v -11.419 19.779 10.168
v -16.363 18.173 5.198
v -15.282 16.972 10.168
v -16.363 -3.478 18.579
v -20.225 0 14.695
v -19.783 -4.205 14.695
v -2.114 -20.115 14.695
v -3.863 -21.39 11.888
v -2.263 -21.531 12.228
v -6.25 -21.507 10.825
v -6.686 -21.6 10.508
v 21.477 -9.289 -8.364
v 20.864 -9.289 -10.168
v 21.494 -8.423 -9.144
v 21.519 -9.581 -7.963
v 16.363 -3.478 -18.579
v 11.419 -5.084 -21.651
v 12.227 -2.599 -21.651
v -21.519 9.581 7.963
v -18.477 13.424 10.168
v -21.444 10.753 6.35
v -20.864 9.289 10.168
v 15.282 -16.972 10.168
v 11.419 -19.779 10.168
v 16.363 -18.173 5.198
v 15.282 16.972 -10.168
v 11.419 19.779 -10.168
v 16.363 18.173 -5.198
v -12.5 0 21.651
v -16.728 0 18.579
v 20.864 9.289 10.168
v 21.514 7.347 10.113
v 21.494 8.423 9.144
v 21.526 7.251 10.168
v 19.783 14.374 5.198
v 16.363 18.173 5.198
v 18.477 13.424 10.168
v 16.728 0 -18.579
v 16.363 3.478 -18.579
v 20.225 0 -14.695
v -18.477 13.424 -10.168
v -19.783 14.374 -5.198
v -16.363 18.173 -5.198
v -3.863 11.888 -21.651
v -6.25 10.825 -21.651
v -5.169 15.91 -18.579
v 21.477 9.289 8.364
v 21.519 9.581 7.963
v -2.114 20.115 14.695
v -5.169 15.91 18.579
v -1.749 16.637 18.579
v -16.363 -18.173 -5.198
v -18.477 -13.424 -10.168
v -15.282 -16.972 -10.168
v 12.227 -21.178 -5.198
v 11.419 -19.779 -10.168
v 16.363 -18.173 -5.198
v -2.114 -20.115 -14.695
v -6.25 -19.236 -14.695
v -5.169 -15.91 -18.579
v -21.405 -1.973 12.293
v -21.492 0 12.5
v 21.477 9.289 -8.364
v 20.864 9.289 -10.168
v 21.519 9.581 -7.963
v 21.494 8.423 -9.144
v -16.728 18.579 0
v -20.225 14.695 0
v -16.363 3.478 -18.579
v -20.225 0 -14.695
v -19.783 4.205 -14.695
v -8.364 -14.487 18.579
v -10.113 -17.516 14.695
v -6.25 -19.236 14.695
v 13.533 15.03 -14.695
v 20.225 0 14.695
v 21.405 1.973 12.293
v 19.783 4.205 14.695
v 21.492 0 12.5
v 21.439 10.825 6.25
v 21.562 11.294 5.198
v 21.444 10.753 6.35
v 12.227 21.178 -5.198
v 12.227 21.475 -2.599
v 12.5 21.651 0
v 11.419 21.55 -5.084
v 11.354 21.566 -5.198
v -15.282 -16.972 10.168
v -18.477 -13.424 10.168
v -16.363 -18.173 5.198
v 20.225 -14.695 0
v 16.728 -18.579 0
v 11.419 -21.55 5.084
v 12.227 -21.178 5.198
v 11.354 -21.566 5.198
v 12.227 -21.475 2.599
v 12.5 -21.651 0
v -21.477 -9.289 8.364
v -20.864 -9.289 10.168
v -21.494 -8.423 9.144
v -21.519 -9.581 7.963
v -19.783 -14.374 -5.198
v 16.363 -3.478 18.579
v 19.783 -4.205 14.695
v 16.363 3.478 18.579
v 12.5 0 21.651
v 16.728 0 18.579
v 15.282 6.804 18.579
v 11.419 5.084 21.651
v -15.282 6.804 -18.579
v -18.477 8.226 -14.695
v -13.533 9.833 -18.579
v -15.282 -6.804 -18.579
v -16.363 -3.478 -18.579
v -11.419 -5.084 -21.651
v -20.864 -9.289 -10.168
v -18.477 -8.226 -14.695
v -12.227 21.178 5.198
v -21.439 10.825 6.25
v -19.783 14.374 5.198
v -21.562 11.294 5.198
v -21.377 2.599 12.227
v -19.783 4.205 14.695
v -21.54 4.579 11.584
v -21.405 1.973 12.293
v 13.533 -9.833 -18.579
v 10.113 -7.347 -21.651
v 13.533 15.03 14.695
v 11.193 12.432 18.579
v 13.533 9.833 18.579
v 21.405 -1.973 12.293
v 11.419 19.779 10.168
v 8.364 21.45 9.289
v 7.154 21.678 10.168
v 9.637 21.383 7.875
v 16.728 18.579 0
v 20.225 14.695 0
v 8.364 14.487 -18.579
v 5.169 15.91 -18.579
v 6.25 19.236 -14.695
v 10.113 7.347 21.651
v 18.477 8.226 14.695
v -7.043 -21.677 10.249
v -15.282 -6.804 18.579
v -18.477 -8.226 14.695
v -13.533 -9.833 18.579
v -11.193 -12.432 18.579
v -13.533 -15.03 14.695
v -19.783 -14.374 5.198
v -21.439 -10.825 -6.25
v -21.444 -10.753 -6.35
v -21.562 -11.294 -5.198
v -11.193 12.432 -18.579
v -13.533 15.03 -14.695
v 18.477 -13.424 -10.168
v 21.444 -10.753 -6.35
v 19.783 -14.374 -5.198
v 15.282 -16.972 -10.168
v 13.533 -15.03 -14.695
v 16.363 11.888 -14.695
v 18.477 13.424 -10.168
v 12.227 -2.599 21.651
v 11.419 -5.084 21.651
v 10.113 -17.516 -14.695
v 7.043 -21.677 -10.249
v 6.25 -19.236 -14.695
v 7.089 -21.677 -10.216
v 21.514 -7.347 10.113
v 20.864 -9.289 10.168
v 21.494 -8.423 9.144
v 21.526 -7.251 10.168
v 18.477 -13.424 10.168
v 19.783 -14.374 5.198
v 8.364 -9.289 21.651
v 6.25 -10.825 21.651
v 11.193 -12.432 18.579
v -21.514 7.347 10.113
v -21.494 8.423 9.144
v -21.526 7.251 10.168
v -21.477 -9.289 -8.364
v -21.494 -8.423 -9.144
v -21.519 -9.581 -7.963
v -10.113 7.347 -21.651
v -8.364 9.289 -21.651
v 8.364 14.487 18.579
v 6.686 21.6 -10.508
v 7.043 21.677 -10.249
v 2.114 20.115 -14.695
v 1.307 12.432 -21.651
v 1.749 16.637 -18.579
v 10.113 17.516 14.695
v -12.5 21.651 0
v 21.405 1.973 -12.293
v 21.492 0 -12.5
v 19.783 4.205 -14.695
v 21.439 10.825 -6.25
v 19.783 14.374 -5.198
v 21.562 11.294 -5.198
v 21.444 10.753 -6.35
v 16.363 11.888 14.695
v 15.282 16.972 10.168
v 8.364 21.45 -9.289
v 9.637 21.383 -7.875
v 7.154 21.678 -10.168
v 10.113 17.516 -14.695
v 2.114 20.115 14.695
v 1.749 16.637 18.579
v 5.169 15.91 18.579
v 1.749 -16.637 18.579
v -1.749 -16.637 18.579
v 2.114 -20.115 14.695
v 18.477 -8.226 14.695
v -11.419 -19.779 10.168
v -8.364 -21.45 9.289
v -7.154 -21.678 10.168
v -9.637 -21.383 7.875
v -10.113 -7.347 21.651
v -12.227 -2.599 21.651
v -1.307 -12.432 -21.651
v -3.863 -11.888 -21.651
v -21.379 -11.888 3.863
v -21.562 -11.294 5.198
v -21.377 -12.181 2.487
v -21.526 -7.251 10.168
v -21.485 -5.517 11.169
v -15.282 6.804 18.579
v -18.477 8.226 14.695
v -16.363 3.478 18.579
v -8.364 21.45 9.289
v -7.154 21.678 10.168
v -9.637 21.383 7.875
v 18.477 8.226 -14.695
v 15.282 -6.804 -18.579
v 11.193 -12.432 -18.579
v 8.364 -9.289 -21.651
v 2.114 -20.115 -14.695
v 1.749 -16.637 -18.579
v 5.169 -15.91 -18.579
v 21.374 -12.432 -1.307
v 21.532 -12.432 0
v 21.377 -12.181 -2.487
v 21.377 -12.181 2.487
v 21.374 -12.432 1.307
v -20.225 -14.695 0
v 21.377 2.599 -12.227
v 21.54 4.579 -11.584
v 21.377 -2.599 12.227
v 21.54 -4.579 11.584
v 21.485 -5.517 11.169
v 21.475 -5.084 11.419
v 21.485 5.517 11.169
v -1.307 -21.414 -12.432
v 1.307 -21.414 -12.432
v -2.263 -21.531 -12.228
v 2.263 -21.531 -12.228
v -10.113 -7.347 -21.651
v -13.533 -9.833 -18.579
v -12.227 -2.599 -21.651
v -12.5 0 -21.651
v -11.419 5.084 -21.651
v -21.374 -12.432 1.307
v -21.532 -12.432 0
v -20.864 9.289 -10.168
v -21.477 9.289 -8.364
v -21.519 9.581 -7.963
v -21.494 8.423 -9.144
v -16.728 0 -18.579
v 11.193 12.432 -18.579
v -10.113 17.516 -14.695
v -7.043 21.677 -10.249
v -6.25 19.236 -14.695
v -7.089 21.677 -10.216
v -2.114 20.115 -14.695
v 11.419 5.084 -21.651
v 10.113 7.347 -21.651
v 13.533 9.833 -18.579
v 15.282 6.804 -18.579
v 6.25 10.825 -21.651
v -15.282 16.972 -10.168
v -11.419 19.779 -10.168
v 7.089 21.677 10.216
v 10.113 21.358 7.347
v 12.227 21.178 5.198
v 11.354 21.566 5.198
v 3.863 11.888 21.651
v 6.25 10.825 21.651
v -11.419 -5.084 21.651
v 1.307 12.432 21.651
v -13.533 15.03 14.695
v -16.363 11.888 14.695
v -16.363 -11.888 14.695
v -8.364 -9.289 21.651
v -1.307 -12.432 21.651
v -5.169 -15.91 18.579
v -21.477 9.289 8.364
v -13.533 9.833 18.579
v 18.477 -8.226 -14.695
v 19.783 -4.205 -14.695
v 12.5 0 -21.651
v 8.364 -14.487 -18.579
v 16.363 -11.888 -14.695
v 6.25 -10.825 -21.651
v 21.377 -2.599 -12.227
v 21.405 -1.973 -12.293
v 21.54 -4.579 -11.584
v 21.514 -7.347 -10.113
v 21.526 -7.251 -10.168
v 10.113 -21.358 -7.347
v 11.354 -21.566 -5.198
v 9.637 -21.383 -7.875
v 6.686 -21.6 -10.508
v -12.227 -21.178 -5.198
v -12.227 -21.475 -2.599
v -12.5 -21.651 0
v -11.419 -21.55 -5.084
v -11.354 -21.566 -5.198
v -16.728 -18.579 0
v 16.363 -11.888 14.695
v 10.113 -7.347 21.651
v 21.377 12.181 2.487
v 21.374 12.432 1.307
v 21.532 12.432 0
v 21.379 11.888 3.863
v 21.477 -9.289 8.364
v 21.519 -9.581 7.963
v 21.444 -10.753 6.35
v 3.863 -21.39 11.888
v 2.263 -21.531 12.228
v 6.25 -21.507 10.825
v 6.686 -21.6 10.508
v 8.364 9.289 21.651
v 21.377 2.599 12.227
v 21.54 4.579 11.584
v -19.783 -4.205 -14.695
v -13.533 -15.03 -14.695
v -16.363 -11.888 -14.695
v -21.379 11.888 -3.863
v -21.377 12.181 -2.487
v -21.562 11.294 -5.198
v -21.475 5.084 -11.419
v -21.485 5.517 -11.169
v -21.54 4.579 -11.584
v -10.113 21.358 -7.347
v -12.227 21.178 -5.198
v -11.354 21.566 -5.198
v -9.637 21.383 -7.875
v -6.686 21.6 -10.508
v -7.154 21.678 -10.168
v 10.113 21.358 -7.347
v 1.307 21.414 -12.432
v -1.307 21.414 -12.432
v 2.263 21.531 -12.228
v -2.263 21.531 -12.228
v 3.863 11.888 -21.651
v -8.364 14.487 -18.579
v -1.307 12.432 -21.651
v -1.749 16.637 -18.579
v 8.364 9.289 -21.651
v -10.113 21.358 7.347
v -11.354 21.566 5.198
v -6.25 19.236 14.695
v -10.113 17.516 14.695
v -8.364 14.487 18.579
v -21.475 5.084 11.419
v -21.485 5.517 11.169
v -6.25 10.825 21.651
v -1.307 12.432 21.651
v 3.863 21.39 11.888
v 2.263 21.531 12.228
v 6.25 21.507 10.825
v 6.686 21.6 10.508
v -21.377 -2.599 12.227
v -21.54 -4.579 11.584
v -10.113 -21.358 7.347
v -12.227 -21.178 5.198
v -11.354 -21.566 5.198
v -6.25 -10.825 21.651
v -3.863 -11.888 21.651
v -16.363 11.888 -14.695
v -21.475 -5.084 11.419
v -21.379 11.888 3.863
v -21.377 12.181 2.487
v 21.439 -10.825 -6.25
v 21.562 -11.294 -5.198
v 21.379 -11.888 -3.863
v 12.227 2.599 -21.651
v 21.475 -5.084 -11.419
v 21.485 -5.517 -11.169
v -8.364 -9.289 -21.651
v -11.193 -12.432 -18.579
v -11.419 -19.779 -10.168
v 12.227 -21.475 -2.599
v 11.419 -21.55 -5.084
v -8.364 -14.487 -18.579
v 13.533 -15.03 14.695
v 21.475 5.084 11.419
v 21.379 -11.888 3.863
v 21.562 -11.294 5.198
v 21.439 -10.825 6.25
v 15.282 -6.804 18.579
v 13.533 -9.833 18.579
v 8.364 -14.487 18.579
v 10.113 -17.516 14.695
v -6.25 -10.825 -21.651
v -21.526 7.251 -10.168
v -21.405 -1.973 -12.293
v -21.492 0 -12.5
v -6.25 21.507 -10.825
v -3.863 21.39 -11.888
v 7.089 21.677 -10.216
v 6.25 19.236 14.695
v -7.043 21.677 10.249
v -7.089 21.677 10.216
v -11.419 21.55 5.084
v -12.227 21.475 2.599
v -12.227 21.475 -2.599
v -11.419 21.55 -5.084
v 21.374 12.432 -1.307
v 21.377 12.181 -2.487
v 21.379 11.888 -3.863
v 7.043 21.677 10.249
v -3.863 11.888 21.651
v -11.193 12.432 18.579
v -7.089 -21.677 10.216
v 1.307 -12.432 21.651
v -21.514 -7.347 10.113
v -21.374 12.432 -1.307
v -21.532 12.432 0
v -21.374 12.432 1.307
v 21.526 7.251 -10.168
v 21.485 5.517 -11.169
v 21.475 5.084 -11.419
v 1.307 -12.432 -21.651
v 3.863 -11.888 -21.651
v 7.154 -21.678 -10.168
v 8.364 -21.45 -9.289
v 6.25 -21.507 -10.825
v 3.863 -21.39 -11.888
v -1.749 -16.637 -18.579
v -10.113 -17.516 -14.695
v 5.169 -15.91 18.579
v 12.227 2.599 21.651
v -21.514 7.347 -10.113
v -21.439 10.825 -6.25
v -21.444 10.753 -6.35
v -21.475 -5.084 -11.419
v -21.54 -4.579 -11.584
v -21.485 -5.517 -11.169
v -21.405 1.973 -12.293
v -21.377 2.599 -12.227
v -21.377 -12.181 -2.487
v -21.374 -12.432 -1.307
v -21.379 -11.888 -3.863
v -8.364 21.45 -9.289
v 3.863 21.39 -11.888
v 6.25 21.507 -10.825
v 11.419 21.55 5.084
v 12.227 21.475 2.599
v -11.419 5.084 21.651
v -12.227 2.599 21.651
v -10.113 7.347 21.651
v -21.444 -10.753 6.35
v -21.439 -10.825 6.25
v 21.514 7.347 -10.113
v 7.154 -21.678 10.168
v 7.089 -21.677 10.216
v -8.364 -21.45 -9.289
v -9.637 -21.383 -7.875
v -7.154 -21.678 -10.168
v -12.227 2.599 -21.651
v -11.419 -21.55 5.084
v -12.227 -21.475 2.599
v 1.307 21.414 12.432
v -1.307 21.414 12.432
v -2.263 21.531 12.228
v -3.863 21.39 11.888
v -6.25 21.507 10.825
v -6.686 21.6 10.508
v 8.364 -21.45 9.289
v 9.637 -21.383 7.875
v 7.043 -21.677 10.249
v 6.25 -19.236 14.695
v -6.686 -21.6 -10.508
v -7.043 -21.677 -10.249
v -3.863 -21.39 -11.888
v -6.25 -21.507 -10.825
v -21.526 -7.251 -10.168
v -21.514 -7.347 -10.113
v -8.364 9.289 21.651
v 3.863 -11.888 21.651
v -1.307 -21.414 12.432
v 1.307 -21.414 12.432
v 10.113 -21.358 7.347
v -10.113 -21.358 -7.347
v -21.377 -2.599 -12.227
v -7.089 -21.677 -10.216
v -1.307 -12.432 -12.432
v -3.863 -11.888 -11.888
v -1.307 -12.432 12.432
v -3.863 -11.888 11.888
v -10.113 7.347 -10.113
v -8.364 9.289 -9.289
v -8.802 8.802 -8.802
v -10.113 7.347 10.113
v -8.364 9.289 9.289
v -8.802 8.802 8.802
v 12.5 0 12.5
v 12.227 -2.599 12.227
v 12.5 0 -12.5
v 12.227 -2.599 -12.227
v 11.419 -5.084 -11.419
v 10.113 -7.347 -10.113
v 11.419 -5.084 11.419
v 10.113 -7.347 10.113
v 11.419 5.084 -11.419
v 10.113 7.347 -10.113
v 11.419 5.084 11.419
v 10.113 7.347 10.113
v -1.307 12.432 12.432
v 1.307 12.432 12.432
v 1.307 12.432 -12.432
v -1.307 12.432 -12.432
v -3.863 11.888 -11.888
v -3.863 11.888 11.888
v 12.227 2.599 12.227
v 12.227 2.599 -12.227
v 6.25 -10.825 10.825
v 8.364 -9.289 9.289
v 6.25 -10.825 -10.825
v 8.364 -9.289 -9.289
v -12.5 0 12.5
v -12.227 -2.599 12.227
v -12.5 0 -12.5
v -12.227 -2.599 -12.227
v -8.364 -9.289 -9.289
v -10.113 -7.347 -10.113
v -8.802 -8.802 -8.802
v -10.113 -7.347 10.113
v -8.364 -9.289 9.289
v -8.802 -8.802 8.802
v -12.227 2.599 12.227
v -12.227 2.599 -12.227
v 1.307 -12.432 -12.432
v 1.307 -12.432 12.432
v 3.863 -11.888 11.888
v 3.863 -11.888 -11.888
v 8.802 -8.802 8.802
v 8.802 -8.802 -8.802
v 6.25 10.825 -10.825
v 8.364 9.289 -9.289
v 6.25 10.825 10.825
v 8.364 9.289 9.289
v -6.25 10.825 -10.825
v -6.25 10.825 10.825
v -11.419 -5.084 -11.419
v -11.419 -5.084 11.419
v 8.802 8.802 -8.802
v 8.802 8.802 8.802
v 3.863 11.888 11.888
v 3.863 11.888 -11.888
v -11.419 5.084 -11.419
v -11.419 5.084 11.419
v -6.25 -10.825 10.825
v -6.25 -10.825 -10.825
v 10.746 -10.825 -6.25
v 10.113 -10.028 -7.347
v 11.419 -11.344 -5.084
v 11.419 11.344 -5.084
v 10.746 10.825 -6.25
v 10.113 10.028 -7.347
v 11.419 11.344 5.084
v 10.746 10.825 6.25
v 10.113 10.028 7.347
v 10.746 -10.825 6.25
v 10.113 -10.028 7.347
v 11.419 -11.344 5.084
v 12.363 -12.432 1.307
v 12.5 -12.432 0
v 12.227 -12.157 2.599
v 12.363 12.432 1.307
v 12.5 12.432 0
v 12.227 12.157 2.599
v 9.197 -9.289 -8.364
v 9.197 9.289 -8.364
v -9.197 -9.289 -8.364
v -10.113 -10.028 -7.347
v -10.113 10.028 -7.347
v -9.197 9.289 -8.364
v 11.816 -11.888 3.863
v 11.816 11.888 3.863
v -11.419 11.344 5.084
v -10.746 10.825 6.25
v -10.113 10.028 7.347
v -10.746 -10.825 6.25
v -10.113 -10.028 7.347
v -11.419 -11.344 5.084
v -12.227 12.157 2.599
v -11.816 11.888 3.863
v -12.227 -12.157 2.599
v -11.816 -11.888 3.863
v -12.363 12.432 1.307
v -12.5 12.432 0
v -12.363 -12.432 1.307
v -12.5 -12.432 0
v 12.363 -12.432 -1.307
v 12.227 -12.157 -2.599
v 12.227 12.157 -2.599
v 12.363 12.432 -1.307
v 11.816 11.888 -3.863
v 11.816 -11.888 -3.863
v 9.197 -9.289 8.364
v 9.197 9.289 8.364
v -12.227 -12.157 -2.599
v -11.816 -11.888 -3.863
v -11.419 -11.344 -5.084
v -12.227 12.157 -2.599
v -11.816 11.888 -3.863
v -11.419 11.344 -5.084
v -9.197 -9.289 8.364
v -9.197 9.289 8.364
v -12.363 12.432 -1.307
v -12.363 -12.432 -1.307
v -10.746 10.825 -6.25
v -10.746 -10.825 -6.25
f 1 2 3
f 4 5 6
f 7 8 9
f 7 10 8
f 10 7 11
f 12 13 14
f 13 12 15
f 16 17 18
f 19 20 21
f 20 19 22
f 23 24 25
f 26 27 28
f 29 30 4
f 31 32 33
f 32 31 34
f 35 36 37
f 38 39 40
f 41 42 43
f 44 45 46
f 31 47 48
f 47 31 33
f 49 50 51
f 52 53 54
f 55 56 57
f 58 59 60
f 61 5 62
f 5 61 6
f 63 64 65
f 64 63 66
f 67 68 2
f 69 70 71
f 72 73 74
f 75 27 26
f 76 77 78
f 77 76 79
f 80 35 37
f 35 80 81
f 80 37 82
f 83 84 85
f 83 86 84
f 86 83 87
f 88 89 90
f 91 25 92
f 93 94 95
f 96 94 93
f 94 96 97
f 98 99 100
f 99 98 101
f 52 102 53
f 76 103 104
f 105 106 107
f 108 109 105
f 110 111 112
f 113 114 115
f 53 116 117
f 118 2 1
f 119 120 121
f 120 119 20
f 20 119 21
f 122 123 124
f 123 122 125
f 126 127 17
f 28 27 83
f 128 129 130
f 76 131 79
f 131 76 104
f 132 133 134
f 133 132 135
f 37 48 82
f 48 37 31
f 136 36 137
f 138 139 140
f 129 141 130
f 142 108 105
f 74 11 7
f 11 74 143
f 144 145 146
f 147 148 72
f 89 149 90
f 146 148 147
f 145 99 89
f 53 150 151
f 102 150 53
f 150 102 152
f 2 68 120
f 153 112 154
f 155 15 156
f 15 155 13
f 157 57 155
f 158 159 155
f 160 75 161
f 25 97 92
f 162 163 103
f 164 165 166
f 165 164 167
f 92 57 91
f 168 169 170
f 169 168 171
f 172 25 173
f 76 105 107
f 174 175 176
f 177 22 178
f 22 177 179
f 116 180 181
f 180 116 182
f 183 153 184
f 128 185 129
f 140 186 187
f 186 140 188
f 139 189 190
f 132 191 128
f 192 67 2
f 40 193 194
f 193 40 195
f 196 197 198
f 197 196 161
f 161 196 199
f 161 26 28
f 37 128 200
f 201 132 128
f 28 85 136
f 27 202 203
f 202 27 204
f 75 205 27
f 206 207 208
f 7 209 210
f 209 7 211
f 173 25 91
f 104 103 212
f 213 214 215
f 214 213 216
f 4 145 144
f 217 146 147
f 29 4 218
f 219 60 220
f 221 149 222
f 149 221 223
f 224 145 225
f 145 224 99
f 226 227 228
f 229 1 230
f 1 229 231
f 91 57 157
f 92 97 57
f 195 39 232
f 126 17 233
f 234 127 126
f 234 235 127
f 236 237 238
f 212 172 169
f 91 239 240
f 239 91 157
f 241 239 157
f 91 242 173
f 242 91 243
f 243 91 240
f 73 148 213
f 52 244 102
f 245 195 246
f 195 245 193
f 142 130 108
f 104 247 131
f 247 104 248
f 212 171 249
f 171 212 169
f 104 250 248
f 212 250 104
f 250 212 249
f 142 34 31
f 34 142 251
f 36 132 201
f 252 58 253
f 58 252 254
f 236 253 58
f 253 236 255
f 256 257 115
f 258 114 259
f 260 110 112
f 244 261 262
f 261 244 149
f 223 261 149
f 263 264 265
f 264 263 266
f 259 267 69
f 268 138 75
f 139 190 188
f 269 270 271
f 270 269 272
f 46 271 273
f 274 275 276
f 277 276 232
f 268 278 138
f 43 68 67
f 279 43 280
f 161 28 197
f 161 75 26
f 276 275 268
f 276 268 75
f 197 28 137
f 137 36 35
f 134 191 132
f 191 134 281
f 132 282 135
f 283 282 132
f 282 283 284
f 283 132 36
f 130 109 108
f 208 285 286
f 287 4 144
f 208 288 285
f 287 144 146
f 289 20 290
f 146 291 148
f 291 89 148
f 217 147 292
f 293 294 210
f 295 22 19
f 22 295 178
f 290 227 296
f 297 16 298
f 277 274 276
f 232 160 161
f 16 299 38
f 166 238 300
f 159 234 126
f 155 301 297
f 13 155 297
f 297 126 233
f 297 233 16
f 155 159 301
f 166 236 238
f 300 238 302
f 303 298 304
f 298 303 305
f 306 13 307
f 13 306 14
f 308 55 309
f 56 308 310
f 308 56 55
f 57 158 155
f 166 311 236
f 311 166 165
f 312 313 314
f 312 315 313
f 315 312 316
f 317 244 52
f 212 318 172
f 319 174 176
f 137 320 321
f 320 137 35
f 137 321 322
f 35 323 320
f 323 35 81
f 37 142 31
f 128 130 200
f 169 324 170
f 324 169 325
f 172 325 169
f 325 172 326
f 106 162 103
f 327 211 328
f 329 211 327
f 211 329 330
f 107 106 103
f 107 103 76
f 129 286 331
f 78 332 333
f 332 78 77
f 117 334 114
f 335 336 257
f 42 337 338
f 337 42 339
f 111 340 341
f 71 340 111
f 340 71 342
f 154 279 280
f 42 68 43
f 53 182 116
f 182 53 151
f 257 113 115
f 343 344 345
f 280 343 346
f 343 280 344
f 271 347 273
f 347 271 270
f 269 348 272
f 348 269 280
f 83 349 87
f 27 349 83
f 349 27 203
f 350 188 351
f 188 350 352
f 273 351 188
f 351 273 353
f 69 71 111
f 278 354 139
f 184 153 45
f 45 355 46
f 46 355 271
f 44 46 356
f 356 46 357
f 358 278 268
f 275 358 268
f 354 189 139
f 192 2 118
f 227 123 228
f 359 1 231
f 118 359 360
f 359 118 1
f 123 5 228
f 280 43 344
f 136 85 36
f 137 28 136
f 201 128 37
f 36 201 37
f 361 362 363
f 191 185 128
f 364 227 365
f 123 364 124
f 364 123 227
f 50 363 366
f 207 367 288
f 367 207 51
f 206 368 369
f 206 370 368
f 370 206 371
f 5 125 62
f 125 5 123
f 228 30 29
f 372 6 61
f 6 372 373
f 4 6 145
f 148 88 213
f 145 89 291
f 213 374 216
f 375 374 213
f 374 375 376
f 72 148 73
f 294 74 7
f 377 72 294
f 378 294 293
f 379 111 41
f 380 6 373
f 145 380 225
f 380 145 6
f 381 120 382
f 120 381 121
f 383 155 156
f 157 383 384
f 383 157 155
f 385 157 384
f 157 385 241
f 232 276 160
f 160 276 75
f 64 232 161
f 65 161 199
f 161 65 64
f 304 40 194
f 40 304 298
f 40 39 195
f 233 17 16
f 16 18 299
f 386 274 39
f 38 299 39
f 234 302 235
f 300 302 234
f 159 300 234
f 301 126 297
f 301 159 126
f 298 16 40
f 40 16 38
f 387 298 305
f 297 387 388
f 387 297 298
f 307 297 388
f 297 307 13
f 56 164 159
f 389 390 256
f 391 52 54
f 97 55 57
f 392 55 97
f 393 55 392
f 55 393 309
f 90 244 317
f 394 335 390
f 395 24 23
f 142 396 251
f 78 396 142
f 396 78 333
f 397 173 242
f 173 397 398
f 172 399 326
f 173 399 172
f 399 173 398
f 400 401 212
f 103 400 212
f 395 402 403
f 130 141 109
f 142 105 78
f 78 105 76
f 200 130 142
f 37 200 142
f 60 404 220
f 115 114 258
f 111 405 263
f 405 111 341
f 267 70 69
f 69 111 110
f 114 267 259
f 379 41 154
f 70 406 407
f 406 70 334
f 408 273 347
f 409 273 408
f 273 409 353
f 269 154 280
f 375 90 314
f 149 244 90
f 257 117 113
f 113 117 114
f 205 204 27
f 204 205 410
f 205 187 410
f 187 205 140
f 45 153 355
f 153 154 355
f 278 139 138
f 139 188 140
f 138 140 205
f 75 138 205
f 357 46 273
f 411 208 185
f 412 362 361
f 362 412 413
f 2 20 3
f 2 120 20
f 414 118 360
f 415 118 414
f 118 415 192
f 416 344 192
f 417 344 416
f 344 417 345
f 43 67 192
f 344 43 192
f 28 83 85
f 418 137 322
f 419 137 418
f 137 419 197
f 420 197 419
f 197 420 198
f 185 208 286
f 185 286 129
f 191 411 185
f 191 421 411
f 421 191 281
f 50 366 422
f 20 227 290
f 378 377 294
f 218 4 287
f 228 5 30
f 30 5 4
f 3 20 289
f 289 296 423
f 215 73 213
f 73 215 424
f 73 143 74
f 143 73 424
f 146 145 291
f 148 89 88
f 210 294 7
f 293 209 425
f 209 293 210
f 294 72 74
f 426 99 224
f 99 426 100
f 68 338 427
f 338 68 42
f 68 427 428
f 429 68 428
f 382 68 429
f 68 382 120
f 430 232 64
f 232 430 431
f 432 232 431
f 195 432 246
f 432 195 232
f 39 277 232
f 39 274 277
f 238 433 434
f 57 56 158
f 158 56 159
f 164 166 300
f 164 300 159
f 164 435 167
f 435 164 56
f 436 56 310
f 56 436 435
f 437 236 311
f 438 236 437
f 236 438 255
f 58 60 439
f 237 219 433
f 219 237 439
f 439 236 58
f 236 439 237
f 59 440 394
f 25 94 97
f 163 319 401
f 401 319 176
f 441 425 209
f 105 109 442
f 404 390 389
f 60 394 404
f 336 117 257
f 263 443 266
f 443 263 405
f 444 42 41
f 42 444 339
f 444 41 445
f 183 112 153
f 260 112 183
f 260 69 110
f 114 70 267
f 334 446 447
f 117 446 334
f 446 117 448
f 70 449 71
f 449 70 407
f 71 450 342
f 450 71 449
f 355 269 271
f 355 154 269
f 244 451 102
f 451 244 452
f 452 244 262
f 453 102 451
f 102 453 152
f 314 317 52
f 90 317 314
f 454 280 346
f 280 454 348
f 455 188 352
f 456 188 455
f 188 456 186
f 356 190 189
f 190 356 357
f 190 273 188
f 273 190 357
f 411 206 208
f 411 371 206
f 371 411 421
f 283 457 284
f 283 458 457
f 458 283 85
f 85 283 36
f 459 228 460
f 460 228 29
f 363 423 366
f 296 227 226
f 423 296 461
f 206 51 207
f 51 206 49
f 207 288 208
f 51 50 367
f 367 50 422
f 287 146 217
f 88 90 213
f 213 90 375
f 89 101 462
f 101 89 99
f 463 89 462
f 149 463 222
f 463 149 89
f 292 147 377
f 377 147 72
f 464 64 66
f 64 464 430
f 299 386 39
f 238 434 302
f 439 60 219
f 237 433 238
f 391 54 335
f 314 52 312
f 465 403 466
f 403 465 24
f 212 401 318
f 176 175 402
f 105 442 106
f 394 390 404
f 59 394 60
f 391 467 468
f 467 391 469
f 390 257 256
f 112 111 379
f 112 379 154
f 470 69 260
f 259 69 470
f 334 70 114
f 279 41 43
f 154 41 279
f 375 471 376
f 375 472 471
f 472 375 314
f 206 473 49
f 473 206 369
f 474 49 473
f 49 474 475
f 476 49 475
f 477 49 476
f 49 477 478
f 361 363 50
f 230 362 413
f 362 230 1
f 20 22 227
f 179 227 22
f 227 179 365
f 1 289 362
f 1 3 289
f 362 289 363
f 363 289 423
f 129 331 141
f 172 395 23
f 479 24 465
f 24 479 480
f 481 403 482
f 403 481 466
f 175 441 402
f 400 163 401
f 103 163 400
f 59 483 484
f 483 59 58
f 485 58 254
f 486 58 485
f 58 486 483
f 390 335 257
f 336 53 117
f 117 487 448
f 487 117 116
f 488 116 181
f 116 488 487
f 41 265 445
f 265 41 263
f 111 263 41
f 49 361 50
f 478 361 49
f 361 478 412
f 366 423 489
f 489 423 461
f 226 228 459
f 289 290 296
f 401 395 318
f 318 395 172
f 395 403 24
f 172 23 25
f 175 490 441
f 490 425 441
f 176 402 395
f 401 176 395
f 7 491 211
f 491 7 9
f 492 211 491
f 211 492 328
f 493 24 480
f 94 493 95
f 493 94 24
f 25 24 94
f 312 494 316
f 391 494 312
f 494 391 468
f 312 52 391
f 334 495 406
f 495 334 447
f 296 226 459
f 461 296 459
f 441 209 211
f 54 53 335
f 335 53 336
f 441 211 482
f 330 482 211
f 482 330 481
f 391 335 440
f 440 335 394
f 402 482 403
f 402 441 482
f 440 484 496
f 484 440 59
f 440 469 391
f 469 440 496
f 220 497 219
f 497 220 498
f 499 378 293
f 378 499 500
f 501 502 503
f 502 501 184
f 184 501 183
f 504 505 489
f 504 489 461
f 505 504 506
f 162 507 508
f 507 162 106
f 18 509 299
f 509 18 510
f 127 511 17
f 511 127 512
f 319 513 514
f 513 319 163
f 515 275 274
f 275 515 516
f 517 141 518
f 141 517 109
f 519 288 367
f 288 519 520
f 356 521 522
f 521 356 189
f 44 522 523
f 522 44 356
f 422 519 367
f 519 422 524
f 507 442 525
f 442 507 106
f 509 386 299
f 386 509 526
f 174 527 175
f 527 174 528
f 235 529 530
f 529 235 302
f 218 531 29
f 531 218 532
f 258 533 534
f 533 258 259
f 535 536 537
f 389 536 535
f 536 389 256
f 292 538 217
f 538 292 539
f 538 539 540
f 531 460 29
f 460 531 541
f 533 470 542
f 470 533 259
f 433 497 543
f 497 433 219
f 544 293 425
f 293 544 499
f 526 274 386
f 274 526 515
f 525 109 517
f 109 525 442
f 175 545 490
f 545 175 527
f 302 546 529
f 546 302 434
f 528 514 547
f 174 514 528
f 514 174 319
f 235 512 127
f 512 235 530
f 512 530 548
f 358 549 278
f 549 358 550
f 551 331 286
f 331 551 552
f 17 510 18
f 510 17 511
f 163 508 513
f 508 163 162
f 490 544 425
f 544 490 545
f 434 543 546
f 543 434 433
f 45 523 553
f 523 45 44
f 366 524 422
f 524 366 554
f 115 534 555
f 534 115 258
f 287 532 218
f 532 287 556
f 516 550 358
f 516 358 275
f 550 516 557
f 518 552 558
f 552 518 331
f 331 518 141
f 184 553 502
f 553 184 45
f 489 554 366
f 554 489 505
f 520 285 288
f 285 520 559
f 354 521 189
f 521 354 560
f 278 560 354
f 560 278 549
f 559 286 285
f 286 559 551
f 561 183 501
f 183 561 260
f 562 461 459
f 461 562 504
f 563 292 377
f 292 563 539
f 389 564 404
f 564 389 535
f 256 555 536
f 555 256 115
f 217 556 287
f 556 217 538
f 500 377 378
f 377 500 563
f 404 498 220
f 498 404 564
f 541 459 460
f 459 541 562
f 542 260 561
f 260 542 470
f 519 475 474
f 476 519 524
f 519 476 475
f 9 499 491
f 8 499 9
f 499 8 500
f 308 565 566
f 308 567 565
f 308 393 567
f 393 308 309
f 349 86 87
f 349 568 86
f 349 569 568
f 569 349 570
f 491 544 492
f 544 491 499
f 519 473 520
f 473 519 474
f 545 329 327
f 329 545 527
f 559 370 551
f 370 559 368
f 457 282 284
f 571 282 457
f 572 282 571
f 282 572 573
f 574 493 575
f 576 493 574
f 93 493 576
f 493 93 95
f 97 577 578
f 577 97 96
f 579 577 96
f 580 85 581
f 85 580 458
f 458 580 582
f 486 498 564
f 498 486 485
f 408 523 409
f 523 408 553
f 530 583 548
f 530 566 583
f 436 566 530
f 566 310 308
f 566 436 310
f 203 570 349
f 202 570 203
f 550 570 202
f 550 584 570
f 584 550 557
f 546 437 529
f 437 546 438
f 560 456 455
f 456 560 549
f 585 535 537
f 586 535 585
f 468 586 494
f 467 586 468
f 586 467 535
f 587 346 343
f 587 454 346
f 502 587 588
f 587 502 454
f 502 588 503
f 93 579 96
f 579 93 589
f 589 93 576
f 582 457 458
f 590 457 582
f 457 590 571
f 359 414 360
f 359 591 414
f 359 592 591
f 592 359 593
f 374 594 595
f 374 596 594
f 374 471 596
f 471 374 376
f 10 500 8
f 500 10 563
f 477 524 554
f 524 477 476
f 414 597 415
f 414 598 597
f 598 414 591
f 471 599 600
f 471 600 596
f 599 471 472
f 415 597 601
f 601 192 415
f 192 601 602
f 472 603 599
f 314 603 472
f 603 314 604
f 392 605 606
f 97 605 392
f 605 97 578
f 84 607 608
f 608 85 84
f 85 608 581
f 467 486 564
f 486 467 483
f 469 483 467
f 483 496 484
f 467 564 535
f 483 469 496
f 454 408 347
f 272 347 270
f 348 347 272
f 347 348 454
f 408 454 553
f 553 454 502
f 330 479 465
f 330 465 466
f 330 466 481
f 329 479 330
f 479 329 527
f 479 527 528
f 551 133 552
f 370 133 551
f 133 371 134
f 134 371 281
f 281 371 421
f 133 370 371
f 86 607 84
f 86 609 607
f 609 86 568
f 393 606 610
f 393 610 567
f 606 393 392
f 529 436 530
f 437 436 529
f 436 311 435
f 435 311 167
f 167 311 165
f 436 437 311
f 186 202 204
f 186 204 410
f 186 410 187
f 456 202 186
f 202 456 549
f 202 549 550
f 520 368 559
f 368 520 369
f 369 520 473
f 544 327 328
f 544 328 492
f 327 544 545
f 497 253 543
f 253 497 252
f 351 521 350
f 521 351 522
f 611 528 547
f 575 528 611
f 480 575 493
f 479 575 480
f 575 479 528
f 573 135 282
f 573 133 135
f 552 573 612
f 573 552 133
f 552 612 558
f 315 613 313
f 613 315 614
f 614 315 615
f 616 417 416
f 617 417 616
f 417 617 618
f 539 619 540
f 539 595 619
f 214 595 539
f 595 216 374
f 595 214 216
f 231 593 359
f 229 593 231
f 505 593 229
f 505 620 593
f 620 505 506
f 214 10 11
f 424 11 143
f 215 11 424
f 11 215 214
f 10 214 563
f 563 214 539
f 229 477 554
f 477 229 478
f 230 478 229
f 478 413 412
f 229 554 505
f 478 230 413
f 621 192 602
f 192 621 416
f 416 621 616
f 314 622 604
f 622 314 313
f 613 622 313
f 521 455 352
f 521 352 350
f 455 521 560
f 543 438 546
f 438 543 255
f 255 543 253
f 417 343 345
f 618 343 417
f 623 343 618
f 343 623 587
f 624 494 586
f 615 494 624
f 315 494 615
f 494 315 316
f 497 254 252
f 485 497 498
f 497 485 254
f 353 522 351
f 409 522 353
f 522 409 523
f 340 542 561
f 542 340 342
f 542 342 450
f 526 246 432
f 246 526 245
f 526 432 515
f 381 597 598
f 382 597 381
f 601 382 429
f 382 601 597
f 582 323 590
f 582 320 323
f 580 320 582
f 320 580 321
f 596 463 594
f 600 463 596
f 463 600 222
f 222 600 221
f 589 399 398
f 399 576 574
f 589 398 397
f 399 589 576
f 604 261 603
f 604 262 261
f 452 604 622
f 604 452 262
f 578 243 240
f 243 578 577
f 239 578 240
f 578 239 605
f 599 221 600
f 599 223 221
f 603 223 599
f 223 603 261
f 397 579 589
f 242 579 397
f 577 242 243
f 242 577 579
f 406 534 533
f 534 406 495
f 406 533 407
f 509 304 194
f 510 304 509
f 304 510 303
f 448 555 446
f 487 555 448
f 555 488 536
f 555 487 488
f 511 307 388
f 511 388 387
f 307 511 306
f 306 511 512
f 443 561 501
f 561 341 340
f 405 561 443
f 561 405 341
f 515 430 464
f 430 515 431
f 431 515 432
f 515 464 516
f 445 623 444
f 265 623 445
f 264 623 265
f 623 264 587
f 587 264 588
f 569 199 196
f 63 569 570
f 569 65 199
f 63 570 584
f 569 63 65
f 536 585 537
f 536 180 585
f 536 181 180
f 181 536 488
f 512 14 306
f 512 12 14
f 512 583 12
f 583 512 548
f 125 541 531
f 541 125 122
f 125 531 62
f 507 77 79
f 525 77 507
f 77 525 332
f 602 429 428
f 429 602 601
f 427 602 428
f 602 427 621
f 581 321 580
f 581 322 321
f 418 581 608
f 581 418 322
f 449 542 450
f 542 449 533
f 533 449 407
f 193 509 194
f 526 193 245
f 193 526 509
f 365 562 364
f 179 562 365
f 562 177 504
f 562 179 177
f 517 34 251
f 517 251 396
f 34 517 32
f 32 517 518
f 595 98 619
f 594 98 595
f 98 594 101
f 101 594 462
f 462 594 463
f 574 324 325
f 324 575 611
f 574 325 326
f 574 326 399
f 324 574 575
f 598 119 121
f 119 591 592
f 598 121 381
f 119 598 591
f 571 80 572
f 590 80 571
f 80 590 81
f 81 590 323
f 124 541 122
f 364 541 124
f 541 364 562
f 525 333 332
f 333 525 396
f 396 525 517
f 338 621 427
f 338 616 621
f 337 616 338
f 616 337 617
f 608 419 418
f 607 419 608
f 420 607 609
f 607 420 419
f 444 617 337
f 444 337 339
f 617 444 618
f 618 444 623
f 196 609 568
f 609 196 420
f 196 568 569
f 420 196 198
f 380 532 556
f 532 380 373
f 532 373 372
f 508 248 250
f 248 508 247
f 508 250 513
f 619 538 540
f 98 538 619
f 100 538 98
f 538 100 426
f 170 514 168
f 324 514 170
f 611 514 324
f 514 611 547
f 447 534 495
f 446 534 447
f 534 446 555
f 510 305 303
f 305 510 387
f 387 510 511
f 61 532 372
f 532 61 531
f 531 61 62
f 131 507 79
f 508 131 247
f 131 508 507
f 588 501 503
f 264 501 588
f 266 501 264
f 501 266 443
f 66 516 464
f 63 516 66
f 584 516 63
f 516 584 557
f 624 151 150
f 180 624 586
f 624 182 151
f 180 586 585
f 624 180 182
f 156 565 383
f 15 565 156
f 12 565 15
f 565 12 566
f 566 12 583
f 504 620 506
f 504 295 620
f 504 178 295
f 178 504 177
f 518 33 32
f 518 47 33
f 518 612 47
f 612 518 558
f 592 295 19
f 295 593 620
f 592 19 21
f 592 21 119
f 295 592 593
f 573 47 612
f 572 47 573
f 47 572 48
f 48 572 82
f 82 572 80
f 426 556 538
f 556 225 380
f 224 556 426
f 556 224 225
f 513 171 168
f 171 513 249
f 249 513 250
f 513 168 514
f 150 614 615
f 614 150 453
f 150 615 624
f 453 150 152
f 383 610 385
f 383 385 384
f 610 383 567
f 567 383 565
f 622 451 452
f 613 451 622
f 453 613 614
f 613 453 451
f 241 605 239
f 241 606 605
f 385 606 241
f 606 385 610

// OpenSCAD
// copy of example001 used for camera tests

module example001()
{
	function r_from_dia(d) = d / 2;

	module rotcy(rot, r, h) {
		rotate(90, rot)
			cylinder(r = r, h = h, center = true);
	}

	difference() {
		sphere(r = r_from_dia(size));
		rotcy([0, 0, 0], cy_r, cy_h);
		rotcy([1, 0, 0], cy_r, cy_h);
		rotcy([0, 1, 0], cy_r, cy_h);
	}

	size = 50;
	hole = 25;

	cy_r = r_from_dia(hole);
	cy_h = r_from_dia(size * 2.5);
}

example001();
